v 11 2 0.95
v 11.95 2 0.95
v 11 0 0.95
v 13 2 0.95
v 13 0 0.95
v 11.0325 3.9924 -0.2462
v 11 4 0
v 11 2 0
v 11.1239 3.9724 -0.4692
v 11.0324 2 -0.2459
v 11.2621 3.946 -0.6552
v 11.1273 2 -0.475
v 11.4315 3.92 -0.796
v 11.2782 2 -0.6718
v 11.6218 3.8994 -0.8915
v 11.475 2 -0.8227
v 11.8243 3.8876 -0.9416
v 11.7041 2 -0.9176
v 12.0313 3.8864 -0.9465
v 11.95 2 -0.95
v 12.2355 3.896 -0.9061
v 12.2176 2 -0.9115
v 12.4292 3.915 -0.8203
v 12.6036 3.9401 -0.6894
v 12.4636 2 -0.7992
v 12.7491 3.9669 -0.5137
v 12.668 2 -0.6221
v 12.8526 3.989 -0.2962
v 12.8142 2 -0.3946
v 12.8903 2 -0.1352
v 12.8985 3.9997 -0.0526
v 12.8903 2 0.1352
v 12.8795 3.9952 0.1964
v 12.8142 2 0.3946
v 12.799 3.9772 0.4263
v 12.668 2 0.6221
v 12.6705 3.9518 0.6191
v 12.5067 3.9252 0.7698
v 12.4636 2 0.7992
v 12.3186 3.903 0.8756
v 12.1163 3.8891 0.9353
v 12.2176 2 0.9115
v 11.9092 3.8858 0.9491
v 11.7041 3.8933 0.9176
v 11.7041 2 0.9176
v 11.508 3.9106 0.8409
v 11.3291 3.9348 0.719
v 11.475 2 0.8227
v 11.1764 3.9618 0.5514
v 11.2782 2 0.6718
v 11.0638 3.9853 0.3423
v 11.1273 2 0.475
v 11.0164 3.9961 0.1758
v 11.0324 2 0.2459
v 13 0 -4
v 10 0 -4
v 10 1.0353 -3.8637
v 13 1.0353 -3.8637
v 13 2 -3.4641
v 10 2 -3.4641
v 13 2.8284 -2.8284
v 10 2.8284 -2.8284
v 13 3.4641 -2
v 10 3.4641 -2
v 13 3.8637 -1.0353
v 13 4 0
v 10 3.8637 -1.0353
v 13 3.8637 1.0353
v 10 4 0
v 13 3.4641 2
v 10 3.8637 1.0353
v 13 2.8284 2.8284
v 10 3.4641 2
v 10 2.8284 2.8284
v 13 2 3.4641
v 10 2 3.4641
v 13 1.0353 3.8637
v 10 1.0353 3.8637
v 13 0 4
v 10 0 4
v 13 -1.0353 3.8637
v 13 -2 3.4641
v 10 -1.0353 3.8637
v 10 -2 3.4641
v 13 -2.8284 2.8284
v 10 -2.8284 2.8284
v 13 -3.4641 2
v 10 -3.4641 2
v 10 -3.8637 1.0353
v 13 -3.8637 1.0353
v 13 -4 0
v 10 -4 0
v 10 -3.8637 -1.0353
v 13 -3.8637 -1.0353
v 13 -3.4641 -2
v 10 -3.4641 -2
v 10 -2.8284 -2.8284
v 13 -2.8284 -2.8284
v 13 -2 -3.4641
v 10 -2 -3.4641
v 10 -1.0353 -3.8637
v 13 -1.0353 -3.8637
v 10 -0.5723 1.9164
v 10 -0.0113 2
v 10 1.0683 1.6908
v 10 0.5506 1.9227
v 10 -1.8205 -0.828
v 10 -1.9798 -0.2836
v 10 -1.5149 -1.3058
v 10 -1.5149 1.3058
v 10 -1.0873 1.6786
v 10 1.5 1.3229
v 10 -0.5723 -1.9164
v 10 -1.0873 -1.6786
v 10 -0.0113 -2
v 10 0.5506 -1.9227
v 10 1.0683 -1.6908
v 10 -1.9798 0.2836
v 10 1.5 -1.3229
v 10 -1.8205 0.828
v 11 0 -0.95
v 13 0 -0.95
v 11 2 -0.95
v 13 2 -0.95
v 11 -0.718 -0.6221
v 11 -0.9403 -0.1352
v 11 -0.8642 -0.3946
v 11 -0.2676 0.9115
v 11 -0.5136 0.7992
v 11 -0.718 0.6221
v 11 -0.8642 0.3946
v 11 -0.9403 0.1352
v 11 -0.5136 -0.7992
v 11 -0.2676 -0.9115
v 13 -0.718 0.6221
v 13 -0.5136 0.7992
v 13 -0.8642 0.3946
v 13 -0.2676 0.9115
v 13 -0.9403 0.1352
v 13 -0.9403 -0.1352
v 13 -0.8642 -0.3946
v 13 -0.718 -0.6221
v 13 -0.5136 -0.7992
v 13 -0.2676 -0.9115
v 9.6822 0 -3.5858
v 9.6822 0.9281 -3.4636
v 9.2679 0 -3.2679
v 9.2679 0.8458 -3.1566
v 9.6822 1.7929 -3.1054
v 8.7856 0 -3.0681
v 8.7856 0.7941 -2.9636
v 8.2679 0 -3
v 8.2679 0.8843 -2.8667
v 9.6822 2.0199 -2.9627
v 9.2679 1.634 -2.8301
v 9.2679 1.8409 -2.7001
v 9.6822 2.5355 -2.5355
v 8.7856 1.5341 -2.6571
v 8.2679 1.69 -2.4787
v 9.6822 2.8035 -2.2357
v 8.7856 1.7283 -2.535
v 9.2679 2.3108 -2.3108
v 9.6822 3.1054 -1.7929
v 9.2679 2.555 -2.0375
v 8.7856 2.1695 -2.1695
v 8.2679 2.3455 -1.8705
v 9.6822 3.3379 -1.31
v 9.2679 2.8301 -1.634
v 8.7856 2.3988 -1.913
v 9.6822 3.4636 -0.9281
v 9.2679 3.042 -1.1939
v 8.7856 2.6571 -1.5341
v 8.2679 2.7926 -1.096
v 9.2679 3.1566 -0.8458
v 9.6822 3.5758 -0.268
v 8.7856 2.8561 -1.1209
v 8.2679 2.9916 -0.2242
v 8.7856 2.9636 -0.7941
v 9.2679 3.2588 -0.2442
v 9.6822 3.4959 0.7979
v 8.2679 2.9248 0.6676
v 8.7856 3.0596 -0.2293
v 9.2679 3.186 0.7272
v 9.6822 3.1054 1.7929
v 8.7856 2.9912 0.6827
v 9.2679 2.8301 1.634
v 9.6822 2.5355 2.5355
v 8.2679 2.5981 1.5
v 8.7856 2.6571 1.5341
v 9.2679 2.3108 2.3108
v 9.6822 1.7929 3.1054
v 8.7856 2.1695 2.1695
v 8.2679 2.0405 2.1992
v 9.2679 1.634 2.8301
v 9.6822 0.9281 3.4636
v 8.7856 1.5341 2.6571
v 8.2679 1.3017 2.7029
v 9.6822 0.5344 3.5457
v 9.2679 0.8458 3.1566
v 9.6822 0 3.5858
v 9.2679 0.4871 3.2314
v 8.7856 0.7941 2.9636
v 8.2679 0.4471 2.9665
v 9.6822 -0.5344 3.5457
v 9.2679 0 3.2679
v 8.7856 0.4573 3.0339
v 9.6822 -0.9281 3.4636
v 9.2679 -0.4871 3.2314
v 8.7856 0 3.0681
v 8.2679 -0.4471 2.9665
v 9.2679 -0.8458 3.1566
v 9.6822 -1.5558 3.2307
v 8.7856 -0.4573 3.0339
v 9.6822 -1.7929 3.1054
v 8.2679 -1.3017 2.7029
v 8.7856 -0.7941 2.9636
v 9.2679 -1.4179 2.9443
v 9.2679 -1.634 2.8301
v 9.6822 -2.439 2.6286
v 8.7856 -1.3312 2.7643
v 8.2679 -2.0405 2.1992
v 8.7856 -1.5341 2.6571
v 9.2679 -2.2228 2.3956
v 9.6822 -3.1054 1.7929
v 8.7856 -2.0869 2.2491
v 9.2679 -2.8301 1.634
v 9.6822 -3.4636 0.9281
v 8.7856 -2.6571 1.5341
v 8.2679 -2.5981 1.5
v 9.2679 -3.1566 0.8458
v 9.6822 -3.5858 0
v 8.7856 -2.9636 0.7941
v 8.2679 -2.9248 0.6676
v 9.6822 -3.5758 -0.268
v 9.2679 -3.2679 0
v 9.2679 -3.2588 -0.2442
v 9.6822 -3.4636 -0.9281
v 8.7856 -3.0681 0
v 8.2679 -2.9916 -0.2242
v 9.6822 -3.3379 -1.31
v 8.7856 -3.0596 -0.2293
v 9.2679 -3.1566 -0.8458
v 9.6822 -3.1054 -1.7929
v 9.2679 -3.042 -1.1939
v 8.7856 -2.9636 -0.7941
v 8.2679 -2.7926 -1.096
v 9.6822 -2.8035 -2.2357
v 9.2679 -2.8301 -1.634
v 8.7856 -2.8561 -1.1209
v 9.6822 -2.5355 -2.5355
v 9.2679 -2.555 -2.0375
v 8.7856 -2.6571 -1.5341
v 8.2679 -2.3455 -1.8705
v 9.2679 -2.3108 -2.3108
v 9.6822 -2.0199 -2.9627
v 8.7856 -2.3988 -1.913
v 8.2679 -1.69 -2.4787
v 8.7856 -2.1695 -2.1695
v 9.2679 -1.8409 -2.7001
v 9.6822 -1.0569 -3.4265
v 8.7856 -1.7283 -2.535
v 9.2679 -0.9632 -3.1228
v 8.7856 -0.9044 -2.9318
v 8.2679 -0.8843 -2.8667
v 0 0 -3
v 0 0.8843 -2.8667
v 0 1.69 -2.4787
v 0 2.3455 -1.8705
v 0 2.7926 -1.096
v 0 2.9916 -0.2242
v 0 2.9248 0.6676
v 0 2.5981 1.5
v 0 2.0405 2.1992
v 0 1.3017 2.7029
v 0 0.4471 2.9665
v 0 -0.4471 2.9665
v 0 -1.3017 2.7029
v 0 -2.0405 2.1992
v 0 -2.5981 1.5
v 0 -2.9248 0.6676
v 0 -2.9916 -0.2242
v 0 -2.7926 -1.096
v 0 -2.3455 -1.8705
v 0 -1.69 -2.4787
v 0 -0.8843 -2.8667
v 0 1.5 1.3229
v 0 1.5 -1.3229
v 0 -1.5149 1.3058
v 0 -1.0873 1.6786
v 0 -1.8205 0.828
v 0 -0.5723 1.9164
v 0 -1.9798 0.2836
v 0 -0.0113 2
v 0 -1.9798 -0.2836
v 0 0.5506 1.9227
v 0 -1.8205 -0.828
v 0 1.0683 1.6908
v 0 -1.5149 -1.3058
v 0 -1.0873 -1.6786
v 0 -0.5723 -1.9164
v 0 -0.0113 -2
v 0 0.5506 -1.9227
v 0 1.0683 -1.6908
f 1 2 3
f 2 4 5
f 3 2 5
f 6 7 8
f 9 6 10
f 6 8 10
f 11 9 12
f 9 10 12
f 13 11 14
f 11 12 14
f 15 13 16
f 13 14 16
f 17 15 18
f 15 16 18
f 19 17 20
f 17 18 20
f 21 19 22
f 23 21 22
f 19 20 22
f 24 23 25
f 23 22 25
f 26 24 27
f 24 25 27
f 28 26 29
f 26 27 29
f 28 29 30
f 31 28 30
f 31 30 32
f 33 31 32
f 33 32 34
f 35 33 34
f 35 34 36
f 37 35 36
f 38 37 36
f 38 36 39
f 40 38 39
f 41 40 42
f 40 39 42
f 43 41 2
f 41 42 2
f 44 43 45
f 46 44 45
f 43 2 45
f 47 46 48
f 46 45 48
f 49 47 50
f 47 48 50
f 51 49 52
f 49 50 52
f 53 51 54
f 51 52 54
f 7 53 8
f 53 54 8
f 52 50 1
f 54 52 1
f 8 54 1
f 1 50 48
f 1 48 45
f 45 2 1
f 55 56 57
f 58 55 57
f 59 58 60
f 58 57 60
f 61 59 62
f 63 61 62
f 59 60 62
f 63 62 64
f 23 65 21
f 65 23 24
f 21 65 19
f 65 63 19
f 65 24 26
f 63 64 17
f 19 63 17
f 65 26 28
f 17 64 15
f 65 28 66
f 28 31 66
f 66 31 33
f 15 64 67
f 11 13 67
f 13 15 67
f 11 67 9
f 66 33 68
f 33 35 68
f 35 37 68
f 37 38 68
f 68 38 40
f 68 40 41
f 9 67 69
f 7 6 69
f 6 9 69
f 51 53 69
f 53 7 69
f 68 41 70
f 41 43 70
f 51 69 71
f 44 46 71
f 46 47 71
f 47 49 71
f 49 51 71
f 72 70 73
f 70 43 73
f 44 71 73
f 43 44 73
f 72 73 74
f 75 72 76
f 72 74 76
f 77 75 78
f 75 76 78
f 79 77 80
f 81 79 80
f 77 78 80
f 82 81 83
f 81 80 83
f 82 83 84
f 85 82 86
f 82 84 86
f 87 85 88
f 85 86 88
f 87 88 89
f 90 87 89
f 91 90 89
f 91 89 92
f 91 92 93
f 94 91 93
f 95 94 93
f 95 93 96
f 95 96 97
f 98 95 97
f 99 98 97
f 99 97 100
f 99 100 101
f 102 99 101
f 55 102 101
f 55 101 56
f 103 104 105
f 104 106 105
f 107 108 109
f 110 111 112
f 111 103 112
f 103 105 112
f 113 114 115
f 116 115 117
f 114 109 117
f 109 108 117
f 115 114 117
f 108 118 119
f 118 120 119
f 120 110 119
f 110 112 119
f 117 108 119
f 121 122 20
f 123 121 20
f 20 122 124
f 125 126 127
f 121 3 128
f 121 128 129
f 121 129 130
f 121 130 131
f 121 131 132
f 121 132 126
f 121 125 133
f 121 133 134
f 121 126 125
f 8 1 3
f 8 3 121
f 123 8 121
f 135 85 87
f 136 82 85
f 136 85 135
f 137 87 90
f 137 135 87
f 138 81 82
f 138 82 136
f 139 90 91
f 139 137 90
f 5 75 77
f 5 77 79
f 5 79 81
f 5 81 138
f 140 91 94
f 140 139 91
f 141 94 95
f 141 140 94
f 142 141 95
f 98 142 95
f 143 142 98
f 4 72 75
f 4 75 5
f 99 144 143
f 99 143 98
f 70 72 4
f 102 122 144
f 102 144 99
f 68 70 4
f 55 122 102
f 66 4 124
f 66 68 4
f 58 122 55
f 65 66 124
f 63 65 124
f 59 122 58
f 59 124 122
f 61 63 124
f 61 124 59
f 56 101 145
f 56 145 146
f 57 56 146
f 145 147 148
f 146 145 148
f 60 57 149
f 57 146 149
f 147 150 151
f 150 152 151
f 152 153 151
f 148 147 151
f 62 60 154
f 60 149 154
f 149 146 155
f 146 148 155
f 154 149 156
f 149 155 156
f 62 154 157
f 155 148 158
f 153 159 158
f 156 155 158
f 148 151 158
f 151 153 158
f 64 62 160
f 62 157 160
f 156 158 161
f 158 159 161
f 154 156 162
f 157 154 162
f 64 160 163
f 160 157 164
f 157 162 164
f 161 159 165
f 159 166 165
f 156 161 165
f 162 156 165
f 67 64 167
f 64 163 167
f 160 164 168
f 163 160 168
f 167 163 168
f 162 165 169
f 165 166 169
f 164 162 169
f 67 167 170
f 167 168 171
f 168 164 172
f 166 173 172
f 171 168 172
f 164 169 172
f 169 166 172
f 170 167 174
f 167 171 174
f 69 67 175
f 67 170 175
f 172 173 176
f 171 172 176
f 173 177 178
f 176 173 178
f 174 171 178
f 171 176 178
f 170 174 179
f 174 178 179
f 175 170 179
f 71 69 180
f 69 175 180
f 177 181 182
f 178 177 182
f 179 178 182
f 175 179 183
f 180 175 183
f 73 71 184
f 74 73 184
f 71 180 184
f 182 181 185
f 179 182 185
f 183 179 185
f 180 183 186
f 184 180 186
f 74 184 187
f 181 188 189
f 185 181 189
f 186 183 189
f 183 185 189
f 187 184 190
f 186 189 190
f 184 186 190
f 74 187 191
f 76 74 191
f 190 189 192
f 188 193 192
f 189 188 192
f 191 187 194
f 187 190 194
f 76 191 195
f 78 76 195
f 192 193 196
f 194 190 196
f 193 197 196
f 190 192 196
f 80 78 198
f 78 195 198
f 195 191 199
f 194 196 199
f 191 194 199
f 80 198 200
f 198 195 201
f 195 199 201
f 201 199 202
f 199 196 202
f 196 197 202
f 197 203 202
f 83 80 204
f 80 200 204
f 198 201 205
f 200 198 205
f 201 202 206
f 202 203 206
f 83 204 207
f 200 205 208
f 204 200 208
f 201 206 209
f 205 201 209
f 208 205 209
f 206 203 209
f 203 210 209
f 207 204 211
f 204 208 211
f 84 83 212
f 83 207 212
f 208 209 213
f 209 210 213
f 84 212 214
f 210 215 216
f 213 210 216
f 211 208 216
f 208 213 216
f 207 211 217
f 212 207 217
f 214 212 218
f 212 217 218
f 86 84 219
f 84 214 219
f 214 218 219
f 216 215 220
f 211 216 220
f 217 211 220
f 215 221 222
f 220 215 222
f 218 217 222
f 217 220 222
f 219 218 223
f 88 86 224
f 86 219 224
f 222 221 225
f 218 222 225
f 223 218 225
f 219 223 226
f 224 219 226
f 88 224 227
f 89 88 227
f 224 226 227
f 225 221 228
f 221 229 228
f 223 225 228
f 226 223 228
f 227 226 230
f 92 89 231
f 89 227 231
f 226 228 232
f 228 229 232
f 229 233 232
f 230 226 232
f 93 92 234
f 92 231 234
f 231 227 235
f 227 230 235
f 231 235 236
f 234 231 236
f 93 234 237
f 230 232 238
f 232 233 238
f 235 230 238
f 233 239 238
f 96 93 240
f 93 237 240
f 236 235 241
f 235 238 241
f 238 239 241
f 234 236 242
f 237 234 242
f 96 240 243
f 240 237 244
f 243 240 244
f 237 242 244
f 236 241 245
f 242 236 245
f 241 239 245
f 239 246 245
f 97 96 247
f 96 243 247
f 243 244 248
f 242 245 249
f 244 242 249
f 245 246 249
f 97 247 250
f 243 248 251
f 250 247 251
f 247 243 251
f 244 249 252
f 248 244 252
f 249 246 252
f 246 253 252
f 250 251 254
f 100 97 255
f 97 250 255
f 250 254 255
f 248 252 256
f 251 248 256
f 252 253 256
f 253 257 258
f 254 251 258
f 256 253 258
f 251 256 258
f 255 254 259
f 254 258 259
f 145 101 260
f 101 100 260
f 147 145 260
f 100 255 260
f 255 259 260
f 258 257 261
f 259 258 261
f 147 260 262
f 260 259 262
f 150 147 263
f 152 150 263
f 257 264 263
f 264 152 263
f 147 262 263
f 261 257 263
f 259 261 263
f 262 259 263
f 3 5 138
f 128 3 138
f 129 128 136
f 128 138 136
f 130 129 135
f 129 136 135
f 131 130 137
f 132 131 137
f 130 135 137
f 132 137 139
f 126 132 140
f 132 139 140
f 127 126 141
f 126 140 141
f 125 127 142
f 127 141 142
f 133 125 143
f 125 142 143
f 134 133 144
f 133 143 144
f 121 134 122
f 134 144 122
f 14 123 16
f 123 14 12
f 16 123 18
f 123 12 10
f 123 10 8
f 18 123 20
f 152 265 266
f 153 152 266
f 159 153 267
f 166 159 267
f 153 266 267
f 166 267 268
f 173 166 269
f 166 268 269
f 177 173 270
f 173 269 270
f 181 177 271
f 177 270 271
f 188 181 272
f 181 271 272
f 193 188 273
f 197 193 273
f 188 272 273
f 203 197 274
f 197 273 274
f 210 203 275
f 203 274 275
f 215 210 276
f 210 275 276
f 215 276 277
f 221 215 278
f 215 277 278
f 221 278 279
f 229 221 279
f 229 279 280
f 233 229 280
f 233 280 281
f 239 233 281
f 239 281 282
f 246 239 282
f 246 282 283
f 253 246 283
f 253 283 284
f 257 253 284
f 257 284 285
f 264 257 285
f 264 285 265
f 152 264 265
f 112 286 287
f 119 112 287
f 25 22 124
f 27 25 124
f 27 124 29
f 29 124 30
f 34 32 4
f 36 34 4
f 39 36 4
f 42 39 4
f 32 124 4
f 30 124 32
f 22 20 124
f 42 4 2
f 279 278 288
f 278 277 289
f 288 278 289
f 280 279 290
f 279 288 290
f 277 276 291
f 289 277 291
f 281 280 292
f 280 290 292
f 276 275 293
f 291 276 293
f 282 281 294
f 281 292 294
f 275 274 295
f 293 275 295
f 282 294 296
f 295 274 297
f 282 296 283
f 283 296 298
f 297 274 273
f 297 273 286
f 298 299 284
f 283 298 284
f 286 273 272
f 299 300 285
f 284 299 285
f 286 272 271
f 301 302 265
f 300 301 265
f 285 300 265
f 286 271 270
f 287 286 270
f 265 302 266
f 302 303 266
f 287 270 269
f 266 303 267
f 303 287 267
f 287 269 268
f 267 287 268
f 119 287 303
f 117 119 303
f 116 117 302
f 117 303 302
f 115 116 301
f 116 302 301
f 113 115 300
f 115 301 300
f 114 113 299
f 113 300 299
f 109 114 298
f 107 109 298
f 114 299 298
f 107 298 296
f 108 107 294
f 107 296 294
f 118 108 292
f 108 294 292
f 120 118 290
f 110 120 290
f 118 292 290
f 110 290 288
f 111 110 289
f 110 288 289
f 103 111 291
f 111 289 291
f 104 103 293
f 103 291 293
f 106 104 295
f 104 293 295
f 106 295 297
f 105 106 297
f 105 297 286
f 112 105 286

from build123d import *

# Parameters (mm, degrees)
SKETCH2_R           = 3
BOSS_EXTRUDE1_DEPTH = 10
SKETCH3_R           = 4
BOSS_EXTRUDE2_DEPTH = 3
FILLET1_R           = 2
CUT_EXTRUDE1_DEPTH  = 2
SKETCH6_R           = 0.95
CUT_EXTRUDE2_DEPTH  = 15.866068747


with BuildPart() as part:
    # Sketch2 → Boss-Extrude1 (new body)
    with BuildSketch(Plane(origin=(0, 0, 0), x_dir=(0, 0, -1), z_dir=(1, 0, 0))):
        Circle(SKETCH2_R)
        with BuildLine():
            Line((-1.322875656, 1.5), (1.322875656, 1.5))
            ThreePointArc((1.322875656, 1.5), (0, -2), (-1.322875656, 1.5))
        make_face(mode=Mode.SUBTRACT)
    extrude(amount=BOSS_EXTRUDE1_DEPTH)

    # Sketch3 → Boss-Extrude2 (add)
    with BuildSketch(Plane(origin=(10, 0, 0), x_dir=(0, 0, -1), z_dir=(1, 0, 0))):
        Circle(SKETCH3_R)
    extrude(amount=BOSS_EXTRUDE2_DEPTH)

    # Fillet1
    # the kernel refuses this fillet: 2 mm, written as the material it adds along each edge
    with BuildSketch(Plane(origin=(10, 0, 0), x_dir=(0, 0, -1), z_dir=(0, -1, 0))) as fillet1_piece_1:
        with BuildLine():
            CenterArc((5, -1.732050808), FILLET1_R, 120, 60)
            Line((3, -1.732050808), (2.96, -1.732050808))
            Line((2.96, -1.732050808), (2.96, 0))
            Line((2.96, 0), (3, 0.04))
            ThreePointArc((3, 0.04), (3.5, 0.04), (3.98, 0.034641016))
            Line((3.98, 0.034641016), (4, 0))
        make_face()
    revolve(axis=Axis((10, 0, 0), (1, 0, 0)))

    # Sketch4 → Cut-Extrude1 (cut)
    with BuildSketch(Plane(origin=(13, 0, 0), x_dir=(0, 0, -1), z_dir=(1, 0, 0))):
        with BuildLine():
            Line((-0.95, 2), (-0.95, 0))
            ThreePointArc((-0.95, 0), (0, -0.95), (0.95, 0))
            Line((0.95, 0), (0.95, 2))
            Line((0.95, 2), (-0.95, 2))
        make_face()
    extrude(amount=-CUT_EXTRUDE1_DEPTH, mode=Mode.SUBTRACT)

    # Sketch6 → Cut-Extrude2 (cut, through all)
    with BuildSketch(Plane(origin=(0, 2, 0), x_dir=(-1, 0, 0), z_dir=(0, -1, 0))):
        with Locations((-11.95, 0)):
            Circle(SKETCH6_R)
    extrude(amount=-CUT_EXTRUDE2_DEPTH, mode=Mode.SUBTRACT)


solid = part.part
